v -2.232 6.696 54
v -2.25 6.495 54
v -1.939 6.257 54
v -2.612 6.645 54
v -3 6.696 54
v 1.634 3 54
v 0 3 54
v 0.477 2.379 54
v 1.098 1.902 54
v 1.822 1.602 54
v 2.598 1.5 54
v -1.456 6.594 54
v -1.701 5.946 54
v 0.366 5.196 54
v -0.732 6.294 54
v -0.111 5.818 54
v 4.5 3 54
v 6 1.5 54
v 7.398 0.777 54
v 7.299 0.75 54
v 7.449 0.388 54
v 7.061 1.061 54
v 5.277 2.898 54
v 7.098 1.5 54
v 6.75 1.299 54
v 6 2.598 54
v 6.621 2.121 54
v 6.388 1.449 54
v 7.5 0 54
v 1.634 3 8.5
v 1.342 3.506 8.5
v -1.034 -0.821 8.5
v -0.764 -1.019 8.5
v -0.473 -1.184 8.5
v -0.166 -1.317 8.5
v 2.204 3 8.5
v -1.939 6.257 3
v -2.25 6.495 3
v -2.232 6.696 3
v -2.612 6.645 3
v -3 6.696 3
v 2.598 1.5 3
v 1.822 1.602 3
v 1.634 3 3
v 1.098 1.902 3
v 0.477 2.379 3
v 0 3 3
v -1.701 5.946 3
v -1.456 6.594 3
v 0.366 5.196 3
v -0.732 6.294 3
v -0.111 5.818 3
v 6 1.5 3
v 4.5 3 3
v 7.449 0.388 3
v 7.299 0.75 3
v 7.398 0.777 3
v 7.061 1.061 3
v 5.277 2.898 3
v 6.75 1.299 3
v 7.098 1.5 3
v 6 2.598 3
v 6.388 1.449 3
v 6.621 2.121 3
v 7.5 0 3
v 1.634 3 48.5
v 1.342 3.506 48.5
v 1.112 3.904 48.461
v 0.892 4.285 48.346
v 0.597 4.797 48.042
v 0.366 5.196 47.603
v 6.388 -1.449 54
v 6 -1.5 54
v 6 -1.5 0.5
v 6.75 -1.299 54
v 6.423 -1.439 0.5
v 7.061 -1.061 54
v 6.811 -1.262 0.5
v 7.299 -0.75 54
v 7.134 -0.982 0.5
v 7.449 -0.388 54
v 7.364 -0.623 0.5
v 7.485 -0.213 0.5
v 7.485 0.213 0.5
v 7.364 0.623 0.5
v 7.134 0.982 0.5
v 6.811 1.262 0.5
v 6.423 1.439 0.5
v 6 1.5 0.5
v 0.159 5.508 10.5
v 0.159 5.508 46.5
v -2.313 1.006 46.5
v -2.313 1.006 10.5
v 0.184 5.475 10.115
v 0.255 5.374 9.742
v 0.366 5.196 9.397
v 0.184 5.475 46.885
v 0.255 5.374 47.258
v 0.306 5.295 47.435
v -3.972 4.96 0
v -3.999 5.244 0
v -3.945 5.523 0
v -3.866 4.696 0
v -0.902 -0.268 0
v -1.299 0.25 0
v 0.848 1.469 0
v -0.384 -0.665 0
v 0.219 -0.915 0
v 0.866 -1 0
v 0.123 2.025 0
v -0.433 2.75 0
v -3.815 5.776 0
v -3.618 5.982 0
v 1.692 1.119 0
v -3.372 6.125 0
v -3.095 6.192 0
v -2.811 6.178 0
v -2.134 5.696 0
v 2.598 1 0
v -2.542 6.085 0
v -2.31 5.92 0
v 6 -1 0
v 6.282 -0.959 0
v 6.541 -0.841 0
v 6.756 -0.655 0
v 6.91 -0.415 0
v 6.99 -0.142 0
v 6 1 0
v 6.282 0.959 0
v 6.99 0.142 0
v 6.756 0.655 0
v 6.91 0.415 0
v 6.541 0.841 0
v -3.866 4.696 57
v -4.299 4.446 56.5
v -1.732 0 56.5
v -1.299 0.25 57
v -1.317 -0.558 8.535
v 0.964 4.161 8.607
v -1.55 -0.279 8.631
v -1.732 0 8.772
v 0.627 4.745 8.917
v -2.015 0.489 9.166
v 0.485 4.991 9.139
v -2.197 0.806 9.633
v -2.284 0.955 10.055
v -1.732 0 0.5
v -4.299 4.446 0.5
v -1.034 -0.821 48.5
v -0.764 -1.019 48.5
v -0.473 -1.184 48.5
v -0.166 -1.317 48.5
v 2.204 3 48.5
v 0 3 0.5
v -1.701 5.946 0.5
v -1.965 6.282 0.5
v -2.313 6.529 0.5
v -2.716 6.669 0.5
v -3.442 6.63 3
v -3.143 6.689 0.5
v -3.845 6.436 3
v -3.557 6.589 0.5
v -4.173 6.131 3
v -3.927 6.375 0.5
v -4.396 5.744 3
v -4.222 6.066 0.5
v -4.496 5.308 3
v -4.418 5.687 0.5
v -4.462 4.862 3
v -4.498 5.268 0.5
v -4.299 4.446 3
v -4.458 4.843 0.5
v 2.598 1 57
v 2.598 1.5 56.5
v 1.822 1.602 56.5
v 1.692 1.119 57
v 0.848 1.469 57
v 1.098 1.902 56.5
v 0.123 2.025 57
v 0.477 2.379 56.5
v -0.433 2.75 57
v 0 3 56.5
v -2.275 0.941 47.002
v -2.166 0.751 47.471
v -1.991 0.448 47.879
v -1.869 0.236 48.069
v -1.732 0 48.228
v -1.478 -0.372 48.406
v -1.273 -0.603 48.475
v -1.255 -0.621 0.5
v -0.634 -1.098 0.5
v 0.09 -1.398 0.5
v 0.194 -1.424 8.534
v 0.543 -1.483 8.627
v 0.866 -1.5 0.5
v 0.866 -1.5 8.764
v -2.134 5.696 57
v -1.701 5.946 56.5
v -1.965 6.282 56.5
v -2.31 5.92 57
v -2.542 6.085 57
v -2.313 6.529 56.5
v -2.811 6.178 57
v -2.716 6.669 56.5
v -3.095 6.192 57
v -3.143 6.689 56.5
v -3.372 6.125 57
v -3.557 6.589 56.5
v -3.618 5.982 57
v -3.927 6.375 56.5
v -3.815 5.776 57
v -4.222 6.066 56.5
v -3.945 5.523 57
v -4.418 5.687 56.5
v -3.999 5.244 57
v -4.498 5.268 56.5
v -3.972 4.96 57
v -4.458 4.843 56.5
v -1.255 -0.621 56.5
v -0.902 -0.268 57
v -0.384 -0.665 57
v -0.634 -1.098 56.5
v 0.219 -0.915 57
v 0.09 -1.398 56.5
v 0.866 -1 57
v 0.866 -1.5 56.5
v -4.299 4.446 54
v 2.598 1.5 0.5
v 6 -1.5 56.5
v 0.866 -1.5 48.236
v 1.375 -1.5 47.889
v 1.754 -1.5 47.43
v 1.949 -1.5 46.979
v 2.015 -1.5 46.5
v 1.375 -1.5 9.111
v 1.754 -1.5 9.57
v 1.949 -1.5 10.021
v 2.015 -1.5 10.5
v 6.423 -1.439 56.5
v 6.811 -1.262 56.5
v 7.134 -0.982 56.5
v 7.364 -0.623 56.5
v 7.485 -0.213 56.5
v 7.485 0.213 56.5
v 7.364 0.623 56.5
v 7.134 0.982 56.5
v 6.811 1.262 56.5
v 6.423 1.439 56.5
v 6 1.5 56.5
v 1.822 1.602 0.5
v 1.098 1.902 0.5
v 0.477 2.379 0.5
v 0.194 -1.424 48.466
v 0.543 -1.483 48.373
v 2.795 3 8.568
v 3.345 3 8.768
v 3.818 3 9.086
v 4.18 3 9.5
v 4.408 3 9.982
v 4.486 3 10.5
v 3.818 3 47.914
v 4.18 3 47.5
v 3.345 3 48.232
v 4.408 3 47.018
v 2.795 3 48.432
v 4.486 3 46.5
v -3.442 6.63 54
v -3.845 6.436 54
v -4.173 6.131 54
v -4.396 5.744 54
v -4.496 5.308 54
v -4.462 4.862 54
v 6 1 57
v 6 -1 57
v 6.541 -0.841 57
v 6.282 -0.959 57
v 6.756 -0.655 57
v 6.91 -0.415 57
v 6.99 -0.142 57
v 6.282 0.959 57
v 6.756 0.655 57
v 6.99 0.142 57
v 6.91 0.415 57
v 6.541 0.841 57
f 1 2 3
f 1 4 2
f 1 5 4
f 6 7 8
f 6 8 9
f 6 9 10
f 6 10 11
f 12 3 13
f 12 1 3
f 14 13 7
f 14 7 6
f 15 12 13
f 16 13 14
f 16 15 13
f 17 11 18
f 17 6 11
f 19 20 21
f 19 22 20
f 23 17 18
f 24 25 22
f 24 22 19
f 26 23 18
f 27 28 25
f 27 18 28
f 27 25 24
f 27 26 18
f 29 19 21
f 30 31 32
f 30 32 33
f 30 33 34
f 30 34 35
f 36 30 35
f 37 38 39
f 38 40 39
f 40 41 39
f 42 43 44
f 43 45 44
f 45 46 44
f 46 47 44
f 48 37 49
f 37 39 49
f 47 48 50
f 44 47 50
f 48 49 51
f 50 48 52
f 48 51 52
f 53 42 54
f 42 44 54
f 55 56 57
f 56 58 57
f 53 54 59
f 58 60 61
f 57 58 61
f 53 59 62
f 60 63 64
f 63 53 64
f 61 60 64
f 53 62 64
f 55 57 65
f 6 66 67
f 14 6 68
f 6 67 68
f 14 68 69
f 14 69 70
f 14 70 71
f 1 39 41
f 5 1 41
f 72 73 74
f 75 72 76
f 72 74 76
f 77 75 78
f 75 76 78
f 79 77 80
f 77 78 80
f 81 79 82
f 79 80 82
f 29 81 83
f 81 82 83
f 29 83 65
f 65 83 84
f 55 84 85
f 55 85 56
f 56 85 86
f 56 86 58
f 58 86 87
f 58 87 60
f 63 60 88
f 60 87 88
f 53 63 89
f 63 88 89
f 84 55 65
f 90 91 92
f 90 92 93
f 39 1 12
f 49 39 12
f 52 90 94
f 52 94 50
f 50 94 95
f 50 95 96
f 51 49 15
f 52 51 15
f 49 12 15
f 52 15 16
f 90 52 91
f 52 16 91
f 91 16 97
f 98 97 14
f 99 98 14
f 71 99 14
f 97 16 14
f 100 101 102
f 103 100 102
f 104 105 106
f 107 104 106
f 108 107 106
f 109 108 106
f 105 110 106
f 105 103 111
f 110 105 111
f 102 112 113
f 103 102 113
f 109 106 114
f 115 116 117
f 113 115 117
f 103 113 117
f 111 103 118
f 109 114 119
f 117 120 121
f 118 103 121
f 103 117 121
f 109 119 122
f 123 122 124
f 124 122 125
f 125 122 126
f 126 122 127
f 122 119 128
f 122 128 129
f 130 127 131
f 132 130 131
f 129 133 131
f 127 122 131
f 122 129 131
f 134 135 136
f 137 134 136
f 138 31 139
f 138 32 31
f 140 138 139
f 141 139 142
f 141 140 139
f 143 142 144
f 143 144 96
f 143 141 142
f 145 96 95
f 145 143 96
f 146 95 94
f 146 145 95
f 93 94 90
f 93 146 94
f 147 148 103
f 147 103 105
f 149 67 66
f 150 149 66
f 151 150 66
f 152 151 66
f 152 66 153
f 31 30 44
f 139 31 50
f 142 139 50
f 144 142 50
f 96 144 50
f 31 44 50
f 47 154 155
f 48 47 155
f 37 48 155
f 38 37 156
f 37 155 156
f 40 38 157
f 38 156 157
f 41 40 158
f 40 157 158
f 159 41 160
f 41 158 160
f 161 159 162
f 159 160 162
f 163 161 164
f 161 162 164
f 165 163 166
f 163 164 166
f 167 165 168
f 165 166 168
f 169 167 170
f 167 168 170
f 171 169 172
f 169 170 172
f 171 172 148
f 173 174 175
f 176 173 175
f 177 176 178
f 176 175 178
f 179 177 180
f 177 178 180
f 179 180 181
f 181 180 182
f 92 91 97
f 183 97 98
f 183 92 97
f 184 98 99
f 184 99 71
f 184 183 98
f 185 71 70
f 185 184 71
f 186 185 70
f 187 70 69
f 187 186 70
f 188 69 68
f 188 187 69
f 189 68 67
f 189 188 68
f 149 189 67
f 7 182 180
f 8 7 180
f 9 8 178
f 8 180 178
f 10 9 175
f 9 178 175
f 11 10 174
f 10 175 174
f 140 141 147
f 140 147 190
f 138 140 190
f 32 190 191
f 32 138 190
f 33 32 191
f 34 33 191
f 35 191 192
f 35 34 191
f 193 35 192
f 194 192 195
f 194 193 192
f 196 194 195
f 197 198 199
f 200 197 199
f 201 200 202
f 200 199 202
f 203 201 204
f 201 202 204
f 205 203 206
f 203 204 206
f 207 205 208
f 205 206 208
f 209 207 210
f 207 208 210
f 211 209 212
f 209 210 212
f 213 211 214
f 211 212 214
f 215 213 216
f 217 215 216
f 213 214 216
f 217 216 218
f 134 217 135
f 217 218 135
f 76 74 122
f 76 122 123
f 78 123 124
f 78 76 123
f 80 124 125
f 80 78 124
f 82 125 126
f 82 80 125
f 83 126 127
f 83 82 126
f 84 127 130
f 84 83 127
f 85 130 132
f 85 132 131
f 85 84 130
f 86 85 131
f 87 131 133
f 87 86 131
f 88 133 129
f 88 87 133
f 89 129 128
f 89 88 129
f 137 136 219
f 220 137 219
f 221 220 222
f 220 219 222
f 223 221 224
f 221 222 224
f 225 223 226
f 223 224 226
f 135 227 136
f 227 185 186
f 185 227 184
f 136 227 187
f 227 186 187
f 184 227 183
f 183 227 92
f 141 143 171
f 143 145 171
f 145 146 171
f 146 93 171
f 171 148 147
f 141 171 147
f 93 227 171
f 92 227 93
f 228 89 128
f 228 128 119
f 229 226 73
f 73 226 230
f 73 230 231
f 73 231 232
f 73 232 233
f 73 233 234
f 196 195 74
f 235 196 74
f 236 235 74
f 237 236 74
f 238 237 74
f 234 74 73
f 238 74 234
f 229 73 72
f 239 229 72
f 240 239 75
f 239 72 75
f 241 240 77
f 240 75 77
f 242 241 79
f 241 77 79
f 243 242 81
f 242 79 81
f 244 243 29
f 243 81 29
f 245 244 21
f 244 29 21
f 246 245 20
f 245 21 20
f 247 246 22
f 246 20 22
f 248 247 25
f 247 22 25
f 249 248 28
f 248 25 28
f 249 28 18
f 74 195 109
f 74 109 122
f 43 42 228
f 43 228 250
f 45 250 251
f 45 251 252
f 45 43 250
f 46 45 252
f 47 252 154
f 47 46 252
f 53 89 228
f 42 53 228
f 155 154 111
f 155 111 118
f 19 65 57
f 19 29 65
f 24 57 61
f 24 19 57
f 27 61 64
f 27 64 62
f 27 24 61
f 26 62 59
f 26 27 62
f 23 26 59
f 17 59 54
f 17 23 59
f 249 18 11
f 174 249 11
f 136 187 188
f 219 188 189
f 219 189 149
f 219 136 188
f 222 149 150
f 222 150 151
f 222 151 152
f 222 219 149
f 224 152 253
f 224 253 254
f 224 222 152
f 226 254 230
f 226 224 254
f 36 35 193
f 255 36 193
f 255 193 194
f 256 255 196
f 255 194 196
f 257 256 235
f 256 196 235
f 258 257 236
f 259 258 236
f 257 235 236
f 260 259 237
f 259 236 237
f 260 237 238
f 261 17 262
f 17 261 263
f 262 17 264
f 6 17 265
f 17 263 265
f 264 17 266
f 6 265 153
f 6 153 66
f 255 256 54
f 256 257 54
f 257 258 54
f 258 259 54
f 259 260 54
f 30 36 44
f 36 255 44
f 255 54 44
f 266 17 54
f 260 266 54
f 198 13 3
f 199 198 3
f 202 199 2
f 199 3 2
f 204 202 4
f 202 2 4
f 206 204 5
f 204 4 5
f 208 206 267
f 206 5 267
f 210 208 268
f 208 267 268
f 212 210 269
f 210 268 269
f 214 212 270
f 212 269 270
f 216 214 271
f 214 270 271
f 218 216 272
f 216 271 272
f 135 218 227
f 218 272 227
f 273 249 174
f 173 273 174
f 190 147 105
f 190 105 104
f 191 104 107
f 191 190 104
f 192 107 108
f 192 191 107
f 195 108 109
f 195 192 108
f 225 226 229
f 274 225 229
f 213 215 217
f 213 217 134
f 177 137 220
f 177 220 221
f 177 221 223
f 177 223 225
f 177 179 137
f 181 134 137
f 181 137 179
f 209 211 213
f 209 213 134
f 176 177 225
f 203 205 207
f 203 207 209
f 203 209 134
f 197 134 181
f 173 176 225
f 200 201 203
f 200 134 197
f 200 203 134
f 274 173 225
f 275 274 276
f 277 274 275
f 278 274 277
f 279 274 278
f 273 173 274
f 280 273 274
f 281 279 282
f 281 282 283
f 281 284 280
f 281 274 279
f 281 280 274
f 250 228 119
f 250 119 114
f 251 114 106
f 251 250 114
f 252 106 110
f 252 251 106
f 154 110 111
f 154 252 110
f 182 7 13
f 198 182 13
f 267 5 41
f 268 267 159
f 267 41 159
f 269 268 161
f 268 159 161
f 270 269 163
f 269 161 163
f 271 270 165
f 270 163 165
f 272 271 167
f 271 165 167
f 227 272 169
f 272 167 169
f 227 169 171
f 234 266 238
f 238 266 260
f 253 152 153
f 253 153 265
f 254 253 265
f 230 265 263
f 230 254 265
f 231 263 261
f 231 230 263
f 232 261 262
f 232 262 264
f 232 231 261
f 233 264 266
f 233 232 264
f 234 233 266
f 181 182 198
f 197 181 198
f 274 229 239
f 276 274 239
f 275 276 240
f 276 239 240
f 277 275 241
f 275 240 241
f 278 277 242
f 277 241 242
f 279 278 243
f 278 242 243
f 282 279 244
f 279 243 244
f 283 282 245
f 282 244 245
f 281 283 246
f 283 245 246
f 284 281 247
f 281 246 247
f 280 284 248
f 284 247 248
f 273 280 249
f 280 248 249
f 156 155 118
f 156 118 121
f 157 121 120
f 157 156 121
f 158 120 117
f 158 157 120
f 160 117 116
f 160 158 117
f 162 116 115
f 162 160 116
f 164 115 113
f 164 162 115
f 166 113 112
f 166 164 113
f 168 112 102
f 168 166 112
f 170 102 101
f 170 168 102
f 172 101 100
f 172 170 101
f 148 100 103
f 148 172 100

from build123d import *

# Parameters (mm, degrees)
EXTRUDE_1_DEPTH     = 3
EXTRUDE_2_DEPTH     = 51
EXTRUDE_3_DEPTH     = 3
FILLET_1_R          = 3
CHAMFER_1_SIZE      = 0.5
SKETCH_4_W          = 5
SKETCH_4_H          = 40
CUT_EXTRUDE_1_DEPTH = 58.742047602
FILLET_2_R          = 2


with BuildPart() as part:
    # 草图1 → 凸台-拉伸1 (new body)
    with BuildSketch(Plane.XY):
        with BuildLine():
            Line((-4.299038106, 4.446152423), (-0.866025404, -1.5))
            Line((-0.866025404, -1.5), (6, -1.5))
            ThreePointArc((6, -1.5), (7.5, 0), (6, 1.5))
            Line((6, 1.5), (0.866025404, 1.5))
            Line((0.866025404, 1.5), (-1.700961894, 5.946152423))
            ThreePointArc((-1.700961894, 5.946152423), (-3.75, 6.495190528), (-4.299038106, 4.446152423))
        make_face()
    extrude(amount=EXTRUDE_1_DEPTH)

    # 草图2 → 凸台-拉伸2 (add)
    with BuildSketch(Plane.XY.offset(3)):
        with BuildLine():
            Line((-0.5, 6.696152423), (-3, 6.696152423))
            ThreePointArc((-3, 6.696152423), (-2.25, 6.495190528), (-1.700961894, 5.946152423))
            Line((-1.700961894, 5.946152423), (0.866025404, 1.5))
            Line((0.866025404, 1.5), (6, 1.5))
            ThreePointArc((6, 1.5), (7.060660172, 1.060660172), (7.5, 0))
            Line((7.5, 0), (7.5, 3))
            Line((7.5, 3), (1.633974596, 3))
            Line((1.633974596, 3), (-0.5, 6.696152423))
        make_face()
        with BuildLine():
            Line((-4.299038106, 4.446152423), (-0.866025404, -1.5))
            Line((-0.866025404, -1.5), (6, -1.5))
            ThreePointArc((6, -1.5), (7.060660172, -1.060660172), (7.5, 0))
            ThreePointArc((7.5, 0), (7.060660172, 1.060660172), (6, 1.5))
            Line((6, 1.5), (0.866025404, 1.5))
            Line((0.866025404, 1.5), (-1.700961894, 5.946152423))
            ThreePointArc((-1.700961894, 5.946152423), (-1.551111261, 5.58438099), (-1.5, 5.196152423))
            ThreePointArc((-1.5, 5.196152423), (-2.611771432, 3.747263683), (-4.299038106, 4.446152423))
        make_face()
        with BuildLine():
            ThreePointArc((-3, 6.696152423), (-4.299038106, 5.946152423), (-4.299038106, 4.446152423))
            ThreePointArc((-4.299038106, 4.446152423), (-2.611771432, 3.747263683), (-1.5, 5.196152423))
            ThreePointArc((-1.5, 5.196152423), (-1.551111261, 5.58438099), (-1.700961894, 5.946152423))
            ThreePointArc((-1.700961894, 5.946152423), (-2.25, 6.495190528), (-3, 6.696152423))
        make_face()
    extrude(amount=EXTRUDE_2_DEPTH)

    # 草图3 → 凸台-拉伸3 (add)
    with BuildSketch(Plane.XY.offset(54)):
        with BuildLine():
            Line((-4.299038106, 4.446152423), (-0.866025404, -1.5))
            Line((-0.866025404, -1.5), (6, -1.5))
            ThreePointArc((6, -1.5), (7.5, 0), (6, 1.5))
            Line((6, 1.5), (0.866025404, 1.5))
            Line((0.866025404, 1.5), (-1.700961894, 5.946152423))
            ThreePointArc((-1.700961894, 5.946152423), (-3.75, 6.495190528), (-4.299038106, 4.446152423))
        make_face()
    extrude(amount=EXTRUDE_3_DEPTH)

    # 圆角1
    fillet_1_edges = [part.edges().sort_by_distance(p)[0] for p in [
        (0.866025404, 1.5, 55.5),
        (7.5, 3, 28.5),
        (-0.5, 6.696152423, 28.5),
        (0.866025404, 1.5, 1.5),
        (-0.866025404, -1.5, 28.5),
    ]]
    fillet(fillet_1_edges, radius=FILLET_1_R - 0.0001)  # a hair under: the kernel refuses the full size

    # 倒角1
    chamfer_1_edges = [part.edges().sort_by_distance(p)[0] for p in [
        (7.5, 0, 57),
        (-3.75, 6.495190528, 57),
        (-3.015530023, 2.223051211, 57),
        (-0.850466513, 4.473051211, 57),
        (4.299009238, 1.5, 57),
        (-3.75, 6.495190528, 0),
        (-0.850466513, 4.473051211, 0),
        (4.299009238, 1.5, 0),
        (3.432983834, -1.5, 0),
        (3.432983834, -1.5, 57),
        (-3.015530023, 2.223051211, 0),
        (-0.633982331, -1.098089609, 0),
        (-0.633982331, -1.098089609, 57),
        (1.098068476, 1.901910391, 57),
        (1.098068476, 1.901910391, 0),
        (7.5, 0, 0),
    ]]
    chamfer(chamfer_1_edges, length=CHAMFER_1_SIZE)

    # 草图4 → 切除-拉伸1 (cut, through all)
    with BuildSketch(Plane(origin=(2.486112979, 4.528124648, 0), x_dir=(0.8765717103484919, -0.4812712713394804, 0), z_dir=(0.4812712713394804, 0.8765717103484919, 0))):
        with Locations((-0.011517908, -28.5)):
            Rectangle(SKETCH_4_W, SKETCH_4_H)
    extrude(amount=-CUT_EXTRUDE_1_DEPTH, mode=Mode.SUBTRACT)

    # 圆角2
    fillet_2_edges = [part.edges().sort_by_distance(p)[0] for p in [
        (-1.076934244, 3.257015136, 48.5),
        (3.250658802, 0.75, 48.5),
        (-1.076934244, 3.257015136, 8.5),
        (3.250658802, 0.75, 8.5),
    ]]
    fillet(fillet_2_edges, radius=FILLET_2_R)


solid = part.part
